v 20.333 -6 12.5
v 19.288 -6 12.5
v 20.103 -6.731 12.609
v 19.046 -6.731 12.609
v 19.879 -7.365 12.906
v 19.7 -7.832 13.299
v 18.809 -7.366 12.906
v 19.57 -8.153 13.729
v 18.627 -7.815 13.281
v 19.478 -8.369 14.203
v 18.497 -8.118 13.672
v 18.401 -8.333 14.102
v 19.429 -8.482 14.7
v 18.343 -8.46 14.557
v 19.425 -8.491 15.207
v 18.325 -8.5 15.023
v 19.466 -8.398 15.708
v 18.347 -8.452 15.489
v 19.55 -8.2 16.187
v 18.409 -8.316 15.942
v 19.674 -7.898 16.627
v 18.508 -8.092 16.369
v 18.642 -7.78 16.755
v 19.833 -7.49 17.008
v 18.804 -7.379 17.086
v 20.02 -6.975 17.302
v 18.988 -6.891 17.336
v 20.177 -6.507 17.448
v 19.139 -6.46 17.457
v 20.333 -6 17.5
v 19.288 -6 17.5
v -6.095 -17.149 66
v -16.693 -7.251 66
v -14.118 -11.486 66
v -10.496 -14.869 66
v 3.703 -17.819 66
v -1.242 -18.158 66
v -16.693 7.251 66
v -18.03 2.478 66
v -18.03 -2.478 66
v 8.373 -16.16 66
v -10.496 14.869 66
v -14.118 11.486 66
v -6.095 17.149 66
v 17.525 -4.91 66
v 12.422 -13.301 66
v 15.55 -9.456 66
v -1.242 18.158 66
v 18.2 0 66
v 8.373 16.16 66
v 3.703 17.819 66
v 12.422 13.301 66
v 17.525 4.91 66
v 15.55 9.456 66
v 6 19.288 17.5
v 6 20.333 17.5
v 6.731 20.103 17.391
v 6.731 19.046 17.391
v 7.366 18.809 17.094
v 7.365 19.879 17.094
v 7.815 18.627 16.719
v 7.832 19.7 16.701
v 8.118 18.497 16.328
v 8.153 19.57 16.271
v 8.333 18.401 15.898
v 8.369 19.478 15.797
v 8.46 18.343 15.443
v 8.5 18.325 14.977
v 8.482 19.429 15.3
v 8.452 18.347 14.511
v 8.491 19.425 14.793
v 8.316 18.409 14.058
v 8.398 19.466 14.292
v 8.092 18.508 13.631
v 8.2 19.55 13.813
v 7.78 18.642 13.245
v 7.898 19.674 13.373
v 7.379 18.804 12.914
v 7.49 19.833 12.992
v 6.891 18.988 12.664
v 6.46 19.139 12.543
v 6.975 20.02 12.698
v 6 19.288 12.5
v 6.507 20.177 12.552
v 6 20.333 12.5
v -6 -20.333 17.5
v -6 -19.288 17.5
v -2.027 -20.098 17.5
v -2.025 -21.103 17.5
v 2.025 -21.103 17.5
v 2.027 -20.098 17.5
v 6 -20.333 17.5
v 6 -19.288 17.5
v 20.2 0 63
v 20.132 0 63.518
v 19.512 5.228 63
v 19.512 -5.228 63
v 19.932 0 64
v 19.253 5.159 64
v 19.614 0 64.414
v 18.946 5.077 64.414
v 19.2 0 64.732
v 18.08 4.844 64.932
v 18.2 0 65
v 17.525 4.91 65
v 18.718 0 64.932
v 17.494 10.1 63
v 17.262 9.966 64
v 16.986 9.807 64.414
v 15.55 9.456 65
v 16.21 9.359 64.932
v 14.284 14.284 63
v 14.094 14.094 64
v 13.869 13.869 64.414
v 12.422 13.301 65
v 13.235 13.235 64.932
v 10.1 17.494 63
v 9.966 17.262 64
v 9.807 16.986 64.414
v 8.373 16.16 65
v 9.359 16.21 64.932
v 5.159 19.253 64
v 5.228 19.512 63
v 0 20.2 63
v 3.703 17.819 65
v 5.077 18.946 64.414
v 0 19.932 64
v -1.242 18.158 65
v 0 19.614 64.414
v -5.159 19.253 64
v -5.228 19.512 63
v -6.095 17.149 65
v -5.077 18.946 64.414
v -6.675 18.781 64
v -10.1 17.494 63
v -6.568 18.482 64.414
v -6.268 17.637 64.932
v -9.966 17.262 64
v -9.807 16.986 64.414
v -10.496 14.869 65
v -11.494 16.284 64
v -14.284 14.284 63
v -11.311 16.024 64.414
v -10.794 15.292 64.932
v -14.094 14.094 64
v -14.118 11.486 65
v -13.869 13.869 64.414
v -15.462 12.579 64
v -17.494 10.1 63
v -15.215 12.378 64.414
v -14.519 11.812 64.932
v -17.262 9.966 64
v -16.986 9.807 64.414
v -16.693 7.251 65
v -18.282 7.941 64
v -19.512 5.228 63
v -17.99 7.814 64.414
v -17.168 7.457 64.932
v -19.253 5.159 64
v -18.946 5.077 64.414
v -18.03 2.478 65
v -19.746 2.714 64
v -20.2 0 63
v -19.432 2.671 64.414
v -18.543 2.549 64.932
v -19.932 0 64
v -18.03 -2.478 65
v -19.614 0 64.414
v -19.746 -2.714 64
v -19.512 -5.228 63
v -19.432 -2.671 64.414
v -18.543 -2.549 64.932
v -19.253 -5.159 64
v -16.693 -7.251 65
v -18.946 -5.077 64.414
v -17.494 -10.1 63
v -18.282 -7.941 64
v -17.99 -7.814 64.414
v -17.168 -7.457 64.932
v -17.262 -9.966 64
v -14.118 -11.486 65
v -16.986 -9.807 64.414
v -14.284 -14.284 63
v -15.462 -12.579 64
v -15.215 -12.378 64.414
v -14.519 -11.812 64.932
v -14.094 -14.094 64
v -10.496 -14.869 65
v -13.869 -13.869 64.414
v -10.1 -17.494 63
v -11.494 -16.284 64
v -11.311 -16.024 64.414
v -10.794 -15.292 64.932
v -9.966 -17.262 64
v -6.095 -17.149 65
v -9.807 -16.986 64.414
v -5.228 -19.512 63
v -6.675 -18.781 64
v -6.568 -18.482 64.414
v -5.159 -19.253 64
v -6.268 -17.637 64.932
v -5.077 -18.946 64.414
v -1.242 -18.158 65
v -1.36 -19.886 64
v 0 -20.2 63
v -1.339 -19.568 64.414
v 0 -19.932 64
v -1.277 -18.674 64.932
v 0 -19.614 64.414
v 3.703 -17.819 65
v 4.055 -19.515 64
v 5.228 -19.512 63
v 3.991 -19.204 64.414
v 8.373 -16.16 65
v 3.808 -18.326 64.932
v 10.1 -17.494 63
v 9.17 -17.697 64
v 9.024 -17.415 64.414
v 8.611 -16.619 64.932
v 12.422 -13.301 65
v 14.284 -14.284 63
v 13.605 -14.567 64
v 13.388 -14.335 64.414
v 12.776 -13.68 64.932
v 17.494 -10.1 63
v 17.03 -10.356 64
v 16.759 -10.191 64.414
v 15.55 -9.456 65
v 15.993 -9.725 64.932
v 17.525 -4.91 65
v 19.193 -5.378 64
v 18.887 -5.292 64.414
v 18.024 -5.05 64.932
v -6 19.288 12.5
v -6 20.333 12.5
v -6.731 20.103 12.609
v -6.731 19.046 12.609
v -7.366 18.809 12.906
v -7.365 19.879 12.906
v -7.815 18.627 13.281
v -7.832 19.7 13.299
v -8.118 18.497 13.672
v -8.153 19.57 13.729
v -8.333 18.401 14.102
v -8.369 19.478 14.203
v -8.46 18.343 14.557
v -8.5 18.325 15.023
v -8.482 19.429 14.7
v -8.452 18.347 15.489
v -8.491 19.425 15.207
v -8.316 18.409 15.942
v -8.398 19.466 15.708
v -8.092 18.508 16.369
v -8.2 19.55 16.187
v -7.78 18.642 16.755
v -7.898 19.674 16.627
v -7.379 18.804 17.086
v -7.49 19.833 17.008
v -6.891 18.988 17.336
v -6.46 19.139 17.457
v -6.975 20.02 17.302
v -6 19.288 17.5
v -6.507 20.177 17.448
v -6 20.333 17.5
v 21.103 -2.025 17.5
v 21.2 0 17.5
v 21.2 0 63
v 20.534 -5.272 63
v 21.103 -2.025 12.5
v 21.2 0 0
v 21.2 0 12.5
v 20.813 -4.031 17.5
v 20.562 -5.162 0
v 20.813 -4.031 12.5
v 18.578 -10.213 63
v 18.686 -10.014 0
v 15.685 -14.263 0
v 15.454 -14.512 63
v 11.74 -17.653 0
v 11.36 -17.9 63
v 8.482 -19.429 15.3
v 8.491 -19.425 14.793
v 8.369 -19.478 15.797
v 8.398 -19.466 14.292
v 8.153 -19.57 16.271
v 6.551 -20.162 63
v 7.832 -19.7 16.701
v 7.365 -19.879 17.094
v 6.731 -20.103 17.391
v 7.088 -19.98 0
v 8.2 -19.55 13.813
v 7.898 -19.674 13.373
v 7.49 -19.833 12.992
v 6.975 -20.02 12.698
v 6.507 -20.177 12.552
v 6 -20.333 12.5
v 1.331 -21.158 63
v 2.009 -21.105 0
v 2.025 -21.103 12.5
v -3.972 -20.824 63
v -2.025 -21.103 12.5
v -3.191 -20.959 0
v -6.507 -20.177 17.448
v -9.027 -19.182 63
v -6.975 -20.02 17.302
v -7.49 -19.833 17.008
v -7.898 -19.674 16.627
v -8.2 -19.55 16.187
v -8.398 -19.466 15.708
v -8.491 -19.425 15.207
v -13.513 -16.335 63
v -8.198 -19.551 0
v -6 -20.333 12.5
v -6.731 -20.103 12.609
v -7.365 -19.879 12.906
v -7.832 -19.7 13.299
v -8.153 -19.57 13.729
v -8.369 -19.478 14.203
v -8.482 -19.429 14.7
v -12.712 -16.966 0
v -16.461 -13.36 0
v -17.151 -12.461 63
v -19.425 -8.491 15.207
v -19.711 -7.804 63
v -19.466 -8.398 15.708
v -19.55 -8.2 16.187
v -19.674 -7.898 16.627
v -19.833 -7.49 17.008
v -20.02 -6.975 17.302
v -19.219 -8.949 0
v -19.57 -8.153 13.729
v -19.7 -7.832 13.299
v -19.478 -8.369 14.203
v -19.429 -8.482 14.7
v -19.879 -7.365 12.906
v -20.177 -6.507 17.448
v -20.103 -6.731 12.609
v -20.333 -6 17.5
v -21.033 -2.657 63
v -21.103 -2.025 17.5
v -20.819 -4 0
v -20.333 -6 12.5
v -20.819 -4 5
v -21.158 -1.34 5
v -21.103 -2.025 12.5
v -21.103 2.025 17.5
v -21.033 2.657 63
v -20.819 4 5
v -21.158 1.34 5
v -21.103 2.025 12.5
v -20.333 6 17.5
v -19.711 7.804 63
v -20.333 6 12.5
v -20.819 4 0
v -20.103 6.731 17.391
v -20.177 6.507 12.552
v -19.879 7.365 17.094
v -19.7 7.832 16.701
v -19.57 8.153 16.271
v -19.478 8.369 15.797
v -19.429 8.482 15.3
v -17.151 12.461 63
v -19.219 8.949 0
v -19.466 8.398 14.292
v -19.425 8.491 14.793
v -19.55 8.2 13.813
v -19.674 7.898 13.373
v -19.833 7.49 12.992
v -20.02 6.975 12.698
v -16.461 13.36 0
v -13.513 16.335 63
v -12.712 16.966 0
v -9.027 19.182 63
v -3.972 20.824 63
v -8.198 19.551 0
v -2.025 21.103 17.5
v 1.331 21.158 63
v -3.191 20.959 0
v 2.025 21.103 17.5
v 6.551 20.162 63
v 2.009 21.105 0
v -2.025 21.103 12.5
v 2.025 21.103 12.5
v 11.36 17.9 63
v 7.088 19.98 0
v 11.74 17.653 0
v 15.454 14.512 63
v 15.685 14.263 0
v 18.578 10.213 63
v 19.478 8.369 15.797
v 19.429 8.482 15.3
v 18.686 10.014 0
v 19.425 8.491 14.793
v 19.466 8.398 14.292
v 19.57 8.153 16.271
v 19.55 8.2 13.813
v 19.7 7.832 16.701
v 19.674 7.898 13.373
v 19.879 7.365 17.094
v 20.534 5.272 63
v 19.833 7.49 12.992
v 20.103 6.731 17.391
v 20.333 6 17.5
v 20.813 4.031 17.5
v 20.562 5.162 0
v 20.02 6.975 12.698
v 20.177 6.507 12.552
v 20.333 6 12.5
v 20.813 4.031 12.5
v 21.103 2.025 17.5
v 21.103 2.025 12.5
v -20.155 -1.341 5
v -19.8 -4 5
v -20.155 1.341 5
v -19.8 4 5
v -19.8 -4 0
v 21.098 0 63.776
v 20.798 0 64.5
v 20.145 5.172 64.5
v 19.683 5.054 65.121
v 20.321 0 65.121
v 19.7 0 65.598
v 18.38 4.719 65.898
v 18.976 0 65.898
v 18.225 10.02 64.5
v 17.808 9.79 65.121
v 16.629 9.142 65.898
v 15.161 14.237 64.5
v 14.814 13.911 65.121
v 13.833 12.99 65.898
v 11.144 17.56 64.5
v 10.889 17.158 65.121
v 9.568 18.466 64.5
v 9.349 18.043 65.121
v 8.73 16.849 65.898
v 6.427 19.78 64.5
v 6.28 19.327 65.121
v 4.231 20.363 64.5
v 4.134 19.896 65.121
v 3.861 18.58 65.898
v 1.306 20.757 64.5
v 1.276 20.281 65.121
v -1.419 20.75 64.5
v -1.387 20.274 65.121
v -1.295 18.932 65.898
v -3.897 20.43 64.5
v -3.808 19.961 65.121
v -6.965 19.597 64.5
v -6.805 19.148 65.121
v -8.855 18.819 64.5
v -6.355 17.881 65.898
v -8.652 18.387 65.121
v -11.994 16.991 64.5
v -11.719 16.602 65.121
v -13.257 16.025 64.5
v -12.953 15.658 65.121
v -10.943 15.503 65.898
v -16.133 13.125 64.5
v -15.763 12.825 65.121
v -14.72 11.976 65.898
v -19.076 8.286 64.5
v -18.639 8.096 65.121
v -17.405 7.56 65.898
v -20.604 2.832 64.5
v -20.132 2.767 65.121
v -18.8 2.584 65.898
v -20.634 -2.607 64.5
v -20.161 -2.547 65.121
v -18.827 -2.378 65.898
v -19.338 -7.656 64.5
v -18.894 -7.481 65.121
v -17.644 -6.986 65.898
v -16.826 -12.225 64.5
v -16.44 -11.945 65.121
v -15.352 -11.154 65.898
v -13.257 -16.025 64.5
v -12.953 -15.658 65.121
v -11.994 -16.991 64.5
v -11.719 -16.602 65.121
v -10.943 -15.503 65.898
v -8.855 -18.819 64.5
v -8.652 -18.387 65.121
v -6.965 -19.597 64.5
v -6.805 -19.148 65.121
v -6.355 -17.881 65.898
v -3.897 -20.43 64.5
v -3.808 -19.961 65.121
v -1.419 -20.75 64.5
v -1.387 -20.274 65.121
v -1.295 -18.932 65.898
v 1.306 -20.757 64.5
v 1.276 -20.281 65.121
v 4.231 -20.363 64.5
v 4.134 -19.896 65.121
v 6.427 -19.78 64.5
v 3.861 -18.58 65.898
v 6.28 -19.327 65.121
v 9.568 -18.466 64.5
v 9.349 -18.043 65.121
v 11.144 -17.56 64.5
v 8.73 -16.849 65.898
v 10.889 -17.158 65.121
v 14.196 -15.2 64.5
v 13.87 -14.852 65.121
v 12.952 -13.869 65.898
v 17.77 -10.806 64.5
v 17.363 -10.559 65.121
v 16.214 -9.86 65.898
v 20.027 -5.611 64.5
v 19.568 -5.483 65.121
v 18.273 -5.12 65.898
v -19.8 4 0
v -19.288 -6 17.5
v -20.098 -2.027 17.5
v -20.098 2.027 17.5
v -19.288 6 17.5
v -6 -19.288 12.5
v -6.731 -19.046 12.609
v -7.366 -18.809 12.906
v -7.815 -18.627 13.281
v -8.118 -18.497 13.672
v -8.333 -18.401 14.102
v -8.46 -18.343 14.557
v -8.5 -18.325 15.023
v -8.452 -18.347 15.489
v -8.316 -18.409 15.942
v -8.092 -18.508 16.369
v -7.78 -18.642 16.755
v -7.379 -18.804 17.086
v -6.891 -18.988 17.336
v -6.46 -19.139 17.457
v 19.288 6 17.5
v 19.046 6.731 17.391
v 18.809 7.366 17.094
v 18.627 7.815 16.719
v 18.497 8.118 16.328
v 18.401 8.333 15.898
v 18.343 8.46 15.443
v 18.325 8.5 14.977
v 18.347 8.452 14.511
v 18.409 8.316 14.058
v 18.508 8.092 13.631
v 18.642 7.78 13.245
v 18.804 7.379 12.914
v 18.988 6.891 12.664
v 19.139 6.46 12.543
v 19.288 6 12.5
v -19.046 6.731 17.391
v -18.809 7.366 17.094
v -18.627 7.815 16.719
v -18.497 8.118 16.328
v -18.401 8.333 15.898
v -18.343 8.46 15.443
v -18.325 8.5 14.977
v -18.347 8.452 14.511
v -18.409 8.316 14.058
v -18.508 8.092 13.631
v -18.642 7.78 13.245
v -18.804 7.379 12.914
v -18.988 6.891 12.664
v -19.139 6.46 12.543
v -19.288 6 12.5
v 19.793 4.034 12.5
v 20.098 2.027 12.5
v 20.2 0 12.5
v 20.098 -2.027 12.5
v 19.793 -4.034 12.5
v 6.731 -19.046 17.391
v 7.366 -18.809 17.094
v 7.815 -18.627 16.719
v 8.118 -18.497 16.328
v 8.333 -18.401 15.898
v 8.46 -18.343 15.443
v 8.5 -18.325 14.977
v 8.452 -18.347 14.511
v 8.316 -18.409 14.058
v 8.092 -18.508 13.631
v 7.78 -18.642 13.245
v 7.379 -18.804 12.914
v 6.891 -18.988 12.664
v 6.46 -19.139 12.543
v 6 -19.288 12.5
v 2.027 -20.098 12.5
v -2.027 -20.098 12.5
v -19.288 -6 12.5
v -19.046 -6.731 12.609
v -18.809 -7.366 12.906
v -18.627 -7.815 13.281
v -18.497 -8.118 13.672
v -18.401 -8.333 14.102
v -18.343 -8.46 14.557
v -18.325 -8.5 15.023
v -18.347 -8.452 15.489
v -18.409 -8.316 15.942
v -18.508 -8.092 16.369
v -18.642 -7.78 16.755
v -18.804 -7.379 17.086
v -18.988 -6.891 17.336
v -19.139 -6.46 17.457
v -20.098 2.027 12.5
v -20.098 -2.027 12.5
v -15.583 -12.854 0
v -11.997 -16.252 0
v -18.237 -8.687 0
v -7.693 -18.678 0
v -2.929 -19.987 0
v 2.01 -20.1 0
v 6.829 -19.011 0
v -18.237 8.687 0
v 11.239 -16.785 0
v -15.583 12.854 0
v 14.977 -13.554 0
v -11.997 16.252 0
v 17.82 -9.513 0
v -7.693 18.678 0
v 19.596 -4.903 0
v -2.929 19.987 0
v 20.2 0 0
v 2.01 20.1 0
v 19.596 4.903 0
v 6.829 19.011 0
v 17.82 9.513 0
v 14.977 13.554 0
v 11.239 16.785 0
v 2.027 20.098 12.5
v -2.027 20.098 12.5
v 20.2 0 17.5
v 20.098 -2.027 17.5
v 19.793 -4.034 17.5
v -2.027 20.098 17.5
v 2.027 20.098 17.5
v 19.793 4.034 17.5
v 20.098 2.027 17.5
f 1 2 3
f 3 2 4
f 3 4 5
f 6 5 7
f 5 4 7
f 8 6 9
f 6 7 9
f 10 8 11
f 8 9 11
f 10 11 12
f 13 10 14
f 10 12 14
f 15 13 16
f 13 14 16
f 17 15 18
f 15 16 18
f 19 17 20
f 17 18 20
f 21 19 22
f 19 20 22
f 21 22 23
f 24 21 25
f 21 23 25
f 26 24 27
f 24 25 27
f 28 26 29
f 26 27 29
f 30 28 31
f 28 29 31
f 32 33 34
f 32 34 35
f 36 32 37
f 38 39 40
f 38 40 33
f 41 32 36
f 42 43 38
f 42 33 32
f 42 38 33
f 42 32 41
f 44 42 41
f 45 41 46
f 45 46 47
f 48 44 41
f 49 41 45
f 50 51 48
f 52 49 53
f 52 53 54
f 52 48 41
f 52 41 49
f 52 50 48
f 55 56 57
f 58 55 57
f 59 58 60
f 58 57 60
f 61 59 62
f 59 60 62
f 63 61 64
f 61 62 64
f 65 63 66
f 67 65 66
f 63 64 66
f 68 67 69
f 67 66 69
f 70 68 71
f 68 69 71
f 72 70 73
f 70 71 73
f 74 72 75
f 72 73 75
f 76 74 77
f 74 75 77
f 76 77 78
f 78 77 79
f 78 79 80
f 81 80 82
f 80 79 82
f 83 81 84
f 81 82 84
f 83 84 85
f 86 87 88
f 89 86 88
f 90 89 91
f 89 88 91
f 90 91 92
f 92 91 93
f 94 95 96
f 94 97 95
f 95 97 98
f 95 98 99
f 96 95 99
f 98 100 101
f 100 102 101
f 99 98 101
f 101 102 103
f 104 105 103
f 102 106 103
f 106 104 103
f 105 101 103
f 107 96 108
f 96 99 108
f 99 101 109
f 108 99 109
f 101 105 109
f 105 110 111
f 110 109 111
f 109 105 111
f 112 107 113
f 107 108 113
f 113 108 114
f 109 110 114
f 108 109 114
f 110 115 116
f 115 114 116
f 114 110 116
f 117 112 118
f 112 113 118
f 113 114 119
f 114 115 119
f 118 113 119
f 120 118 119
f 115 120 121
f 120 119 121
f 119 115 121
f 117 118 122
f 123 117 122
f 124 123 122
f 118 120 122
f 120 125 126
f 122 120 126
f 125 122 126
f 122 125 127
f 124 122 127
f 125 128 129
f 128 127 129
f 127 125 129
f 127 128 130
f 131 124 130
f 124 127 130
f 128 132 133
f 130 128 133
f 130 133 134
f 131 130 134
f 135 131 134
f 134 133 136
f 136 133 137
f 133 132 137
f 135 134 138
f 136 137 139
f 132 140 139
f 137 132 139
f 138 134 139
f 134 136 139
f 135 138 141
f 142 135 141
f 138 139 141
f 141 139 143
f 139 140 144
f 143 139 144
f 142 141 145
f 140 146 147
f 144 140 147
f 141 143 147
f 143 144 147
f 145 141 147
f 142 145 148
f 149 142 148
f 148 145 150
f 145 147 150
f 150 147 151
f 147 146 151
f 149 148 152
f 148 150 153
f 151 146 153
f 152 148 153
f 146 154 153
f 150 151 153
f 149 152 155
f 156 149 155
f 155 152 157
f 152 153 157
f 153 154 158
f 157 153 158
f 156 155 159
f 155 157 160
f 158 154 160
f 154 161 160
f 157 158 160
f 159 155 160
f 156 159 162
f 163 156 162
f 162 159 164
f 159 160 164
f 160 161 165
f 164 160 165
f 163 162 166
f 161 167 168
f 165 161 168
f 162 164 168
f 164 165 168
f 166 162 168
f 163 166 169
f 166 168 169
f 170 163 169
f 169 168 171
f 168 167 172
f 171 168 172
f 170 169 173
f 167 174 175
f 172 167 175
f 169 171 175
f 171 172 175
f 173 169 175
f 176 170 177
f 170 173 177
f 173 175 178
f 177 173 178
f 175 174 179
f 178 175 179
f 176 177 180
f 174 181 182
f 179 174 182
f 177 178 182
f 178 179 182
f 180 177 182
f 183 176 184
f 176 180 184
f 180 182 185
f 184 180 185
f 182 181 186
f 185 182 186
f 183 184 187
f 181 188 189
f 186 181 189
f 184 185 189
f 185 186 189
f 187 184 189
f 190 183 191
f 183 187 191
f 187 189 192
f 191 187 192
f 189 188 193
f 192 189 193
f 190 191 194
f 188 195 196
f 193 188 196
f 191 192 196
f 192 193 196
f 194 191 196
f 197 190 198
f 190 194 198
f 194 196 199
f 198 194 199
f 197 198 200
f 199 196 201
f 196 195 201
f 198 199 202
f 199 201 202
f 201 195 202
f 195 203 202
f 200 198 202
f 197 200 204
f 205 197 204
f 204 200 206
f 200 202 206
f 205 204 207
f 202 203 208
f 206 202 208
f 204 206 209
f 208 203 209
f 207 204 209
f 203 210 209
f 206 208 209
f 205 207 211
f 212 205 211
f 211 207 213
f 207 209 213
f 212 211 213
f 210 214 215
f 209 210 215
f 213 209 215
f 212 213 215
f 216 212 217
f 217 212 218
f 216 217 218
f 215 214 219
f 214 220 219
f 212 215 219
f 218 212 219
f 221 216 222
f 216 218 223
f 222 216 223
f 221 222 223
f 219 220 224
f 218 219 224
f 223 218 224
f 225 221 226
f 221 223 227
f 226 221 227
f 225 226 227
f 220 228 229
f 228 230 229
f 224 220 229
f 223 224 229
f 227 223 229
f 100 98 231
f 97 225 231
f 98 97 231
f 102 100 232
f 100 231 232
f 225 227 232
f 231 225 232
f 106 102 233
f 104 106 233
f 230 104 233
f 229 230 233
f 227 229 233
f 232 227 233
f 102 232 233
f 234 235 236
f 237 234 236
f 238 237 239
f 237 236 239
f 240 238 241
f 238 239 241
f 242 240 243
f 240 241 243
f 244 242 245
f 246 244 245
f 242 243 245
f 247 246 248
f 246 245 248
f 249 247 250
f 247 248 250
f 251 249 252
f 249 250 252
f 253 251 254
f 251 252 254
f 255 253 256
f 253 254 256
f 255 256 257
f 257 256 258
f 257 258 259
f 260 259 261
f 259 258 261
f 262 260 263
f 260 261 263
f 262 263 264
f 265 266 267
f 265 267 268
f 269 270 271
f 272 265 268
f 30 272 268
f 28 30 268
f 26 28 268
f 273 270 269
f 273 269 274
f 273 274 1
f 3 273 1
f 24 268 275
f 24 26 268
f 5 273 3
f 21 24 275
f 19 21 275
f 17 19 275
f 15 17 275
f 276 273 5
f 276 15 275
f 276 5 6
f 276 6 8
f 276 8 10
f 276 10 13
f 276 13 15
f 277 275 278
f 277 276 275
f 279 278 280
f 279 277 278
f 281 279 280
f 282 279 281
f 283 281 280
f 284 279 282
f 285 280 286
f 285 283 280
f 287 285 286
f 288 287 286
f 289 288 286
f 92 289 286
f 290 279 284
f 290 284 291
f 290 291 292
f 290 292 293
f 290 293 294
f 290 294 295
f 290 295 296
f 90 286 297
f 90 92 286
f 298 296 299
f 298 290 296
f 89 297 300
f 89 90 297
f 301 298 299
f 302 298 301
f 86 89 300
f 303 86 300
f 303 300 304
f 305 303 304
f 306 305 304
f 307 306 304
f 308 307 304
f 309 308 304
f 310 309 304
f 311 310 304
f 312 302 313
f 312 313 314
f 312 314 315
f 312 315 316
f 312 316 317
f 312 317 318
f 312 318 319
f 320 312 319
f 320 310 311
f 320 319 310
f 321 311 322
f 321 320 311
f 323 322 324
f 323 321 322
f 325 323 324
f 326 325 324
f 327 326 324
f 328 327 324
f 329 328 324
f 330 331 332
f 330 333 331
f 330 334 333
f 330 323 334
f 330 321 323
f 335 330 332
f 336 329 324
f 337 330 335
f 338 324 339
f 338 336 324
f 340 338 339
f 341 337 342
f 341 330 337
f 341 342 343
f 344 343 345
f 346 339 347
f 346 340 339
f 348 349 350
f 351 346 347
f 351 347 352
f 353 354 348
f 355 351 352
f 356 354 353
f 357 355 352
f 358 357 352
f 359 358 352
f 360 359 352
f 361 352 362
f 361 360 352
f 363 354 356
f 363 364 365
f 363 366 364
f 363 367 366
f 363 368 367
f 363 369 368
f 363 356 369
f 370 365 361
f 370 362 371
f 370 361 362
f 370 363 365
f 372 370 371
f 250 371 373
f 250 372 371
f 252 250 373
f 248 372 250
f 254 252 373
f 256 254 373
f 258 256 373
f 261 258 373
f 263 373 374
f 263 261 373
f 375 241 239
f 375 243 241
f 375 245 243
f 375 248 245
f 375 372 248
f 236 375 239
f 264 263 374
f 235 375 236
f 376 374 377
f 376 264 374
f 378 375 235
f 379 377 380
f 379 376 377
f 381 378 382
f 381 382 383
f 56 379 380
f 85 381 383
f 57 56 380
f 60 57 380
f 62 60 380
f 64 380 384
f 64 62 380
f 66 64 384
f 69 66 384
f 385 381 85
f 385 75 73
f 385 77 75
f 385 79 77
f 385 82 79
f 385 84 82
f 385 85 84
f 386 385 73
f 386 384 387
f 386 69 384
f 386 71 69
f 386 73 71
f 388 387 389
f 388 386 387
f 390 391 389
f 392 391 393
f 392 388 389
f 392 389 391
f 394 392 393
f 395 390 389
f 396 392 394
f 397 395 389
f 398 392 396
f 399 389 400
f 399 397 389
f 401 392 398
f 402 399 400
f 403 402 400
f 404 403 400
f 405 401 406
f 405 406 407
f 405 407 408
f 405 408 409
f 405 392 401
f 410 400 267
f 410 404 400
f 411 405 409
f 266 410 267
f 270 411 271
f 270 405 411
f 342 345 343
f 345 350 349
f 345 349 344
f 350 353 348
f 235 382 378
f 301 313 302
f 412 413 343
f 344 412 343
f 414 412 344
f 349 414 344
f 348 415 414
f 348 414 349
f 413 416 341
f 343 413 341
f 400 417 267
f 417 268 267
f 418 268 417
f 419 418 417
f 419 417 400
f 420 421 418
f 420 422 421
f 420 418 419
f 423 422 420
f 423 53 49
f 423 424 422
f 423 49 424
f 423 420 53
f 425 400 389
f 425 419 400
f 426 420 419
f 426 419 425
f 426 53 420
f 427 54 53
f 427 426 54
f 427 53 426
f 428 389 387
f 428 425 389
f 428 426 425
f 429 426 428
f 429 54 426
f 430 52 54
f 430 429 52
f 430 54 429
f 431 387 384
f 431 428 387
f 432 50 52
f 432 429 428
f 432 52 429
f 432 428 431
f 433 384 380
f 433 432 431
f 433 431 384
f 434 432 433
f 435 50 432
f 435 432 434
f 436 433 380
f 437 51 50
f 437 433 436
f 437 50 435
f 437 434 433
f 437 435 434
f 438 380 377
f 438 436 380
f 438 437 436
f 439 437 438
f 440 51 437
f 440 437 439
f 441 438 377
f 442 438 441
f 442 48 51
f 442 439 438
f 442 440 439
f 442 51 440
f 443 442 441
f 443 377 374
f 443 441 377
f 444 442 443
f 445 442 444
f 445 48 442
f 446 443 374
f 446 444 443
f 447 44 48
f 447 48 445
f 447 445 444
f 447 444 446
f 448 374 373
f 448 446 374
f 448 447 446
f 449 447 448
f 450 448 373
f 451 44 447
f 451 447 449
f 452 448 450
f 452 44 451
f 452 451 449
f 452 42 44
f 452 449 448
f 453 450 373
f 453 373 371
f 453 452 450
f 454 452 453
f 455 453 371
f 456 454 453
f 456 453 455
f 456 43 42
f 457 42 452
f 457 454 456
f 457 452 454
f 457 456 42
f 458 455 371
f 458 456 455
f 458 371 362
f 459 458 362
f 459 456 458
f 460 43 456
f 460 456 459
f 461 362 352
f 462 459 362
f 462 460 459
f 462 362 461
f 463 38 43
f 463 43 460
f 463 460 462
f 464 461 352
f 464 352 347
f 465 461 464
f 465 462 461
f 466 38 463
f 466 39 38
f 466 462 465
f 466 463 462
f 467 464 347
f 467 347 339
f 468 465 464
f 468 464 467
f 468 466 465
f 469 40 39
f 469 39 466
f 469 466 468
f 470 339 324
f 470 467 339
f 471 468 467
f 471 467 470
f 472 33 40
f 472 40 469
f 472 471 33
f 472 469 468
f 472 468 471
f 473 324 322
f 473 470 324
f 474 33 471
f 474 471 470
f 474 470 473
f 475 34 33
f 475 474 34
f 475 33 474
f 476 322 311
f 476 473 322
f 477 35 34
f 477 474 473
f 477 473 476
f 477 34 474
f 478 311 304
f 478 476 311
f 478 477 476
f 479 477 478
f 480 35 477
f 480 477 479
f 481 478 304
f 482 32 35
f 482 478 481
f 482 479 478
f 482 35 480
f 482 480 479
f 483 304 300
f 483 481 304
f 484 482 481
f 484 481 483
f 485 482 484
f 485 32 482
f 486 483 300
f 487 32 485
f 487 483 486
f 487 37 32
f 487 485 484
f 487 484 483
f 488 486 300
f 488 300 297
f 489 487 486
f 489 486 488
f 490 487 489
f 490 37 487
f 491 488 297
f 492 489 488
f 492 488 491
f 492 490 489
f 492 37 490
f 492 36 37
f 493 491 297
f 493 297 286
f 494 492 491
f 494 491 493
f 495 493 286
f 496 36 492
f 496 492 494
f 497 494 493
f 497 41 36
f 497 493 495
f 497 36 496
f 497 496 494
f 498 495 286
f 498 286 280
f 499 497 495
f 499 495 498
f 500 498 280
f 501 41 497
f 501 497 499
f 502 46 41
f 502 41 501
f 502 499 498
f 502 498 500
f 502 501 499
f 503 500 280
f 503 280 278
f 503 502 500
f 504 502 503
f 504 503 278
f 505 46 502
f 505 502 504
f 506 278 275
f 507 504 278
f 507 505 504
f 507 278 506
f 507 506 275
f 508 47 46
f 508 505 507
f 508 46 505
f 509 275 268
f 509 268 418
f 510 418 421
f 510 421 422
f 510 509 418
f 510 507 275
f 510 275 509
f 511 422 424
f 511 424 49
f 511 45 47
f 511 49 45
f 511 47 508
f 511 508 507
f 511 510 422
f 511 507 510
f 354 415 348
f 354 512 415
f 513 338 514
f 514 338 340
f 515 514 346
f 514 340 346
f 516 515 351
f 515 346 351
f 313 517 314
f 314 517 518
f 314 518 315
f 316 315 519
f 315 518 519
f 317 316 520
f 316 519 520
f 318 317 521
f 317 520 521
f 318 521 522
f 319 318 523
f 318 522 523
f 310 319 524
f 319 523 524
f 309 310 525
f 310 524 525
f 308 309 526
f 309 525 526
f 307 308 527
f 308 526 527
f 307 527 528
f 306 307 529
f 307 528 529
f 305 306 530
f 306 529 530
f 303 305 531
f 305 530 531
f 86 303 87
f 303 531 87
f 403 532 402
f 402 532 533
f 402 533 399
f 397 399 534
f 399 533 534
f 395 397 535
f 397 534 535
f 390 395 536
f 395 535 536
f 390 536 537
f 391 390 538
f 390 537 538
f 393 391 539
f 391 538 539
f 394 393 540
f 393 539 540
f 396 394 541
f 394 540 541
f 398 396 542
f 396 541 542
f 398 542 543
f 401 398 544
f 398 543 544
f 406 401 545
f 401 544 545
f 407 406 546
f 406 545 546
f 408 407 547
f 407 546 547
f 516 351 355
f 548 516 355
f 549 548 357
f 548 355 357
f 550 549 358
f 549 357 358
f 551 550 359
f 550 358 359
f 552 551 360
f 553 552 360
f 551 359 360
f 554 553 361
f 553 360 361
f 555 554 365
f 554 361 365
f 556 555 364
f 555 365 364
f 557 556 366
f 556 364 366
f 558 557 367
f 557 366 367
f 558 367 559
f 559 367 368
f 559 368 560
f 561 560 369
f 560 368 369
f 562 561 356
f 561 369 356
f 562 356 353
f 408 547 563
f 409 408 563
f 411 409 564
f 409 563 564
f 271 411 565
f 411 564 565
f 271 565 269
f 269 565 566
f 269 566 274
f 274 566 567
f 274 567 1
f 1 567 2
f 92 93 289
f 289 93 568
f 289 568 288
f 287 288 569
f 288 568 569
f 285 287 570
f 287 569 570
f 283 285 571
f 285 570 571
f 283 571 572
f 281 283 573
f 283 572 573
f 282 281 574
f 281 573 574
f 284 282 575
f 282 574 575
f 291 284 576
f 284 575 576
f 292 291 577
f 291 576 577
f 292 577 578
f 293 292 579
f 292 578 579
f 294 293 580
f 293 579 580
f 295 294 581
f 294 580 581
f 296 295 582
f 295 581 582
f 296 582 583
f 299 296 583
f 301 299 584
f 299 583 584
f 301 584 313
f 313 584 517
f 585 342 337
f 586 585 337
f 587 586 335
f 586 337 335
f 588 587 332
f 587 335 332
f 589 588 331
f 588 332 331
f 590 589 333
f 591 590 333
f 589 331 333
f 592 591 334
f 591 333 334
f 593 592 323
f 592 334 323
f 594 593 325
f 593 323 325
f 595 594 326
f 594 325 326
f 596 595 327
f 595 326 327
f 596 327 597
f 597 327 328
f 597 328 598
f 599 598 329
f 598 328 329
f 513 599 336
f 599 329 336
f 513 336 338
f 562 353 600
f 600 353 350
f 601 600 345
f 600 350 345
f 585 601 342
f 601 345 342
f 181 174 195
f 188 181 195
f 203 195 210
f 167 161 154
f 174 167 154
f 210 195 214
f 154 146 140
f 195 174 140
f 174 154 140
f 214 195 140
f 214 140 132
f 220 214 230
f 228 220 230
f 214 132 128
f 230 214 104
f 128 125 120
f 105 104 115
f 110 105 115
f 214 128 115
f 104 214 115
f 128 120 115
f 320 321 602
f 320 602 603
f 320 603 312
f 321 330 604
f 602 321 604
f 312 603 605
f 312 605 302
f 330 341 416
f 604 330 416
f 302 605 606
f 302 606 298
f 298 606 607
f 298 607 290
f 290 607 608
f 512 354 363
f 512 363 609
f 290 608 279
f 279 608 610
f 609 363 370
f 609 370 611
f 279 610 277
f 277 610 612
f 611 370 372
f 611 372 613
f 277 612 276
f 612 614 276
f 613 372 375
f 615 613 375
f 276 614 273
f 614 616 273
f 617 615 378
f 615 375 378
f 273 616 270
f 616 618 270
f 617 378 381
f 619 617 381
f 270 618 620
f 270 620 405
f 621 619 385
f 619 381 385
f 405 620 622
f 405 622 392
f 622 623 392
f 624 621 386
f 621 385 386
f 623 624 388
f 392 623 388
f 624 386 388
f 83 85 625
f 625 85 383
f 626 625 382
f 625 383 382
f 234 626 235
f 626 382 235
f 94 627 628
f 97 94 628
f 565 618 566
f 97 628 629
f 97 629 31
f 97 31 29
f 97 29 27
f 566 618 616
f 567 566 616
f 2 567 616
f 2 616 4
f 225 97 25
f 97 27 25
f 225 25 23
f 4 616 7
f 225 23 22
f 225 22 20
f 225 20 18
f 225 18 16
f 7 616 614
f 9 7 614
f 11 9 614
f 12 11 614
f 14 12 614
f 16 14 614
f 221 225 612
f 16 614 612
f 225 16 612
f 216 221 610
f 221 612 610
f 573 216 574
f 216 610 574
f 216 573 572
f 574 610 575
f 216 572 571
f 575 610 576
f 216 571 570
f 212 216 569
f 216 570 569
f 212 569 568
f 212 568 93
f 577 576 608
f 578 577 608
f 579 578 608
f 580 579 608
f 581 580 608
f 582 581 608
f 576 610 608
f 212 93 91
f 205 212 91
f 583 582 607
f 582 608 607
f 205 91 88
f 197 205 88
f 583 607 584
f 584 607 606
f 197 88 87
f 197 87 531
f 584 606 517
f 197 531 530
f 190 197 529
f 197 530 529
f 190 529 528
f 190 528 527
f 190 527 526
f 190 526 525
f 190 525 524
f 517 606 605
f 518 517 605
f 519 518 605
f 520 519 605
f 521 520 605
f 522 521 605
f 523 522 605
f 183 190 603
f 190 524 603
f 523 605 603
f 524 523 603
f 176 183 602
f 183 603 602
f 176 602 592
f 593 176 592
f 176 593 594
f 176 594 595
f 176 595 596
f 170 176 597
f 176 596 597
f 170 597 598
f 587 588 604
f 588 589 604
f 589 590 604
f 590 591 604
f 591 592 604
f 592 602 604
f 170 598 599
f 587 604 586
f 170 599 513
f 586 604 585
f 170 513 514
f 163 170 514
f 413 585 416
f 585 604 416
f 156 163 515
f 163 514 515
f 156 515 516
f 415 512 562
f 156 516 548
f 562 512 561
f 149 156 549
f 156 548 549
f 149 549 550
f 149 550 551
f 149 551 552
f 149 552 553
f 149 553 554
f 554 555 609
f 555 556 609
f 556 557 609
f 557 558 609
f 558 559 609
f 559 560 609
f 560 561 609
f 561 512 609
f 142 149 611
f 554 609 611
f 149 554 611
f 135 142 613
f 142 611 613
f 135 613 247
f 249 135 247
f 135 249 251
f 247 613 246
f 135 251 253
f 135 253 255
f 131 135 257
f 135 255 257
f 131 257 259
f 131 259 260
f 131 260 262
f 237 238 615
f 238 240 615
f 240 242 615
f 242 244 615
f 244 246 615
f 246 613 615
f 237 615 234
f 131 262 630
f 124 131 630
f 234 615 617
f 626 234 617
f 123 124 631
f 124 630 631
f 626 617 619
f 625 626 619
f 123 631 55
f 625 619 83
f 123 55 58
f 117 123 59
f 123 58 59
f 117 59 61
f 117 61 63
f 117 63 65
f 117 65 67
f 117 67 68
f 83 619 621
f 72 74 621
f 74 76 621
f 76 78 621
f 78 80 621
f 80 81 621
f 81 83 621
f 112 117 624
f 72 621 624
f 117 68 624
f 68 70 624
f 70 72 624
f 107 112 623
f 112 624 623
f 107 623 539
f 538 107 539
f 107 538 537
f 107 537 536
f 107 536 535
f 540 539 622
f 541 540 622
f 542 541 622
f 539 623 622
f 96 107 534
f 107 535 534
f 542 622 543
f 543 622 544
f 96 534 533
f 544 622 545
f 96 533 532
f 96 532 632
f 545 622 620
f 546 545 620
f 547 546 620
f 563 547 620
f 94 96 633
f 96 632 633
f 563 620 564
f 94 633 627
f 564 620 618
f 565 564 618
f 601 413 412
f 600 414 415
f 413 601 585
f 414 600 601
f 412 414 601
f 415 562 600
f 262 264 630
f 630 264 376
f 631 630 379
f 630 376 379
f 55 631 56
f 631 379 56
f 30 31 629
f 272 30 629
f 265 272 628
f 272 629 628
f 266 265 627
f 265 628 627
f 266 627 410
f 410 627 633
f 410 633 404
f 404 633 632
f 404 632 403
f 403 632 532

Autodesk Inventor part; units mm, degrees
ref_plane "YZ Plane" through (0, 0, 0) normal (1, 0, 0) x (0, 1, 0)
ref_plane "XZ Plane" through (0, 0, 0) normal (0, 1, 0) x (-1, 0, 0)
sketch "스케치1" plane through (0, 0, 0) normal (0, 0, 1) x (1, 0, 0)
  circle A0 centre (0, 0) radius 21.2
  dimension "d0" = 42.4
extrude "돌출1" add sketch "스케치1" along normal blind 30
sketch "스케치2" plane through (0, 0, 30) normal (0, 0, 1) x (1, 0, 0)
  circle A0 centre (0, 0) radius 21.2
  dimension "d3" = 42.4
extrude "돌출2" add sketch "스케치2" along normal blind 30
sketch "스케치3" plane through (0, 0, 60) normal (0, 0, 1) x (1, 0, 0)
  circle A0 centre (0, 0) radius 21.2
  dimension "d6" = 42.4
extrude "돌출3" add sketch "스케치3" along normal blind 6
fillet "모깎기1" radius 3 1 edges at (-21.2, 0, 66)
shell "쉘1" thickness 1 removed faces 1 at (2.7392, 4.6861, 0)
ref_plane "작업 평면1" through (0, 21.2, 0) normal (0, 1, 0) x (-1, 0, 0)
sketch "스케치12" plane through (0, 21.2, 0) normal (0, 1, 0) x (-1, 0, 0)
  line L0 (0, 0) -> (0, 60)
  line L1 (0, 60) -> (0, 30)
  line L2 (0, 30) -> (0, 15)
  line L3 (-6, 15) -> (6, 15) construction
  line L4 (-6, 12.5) -> (6, 12.5)
  line L5 (6, 17.5) -> (-6, 17.5)
  arc A0 (-6, 17.5) -> (-6, 12.5) centre (-6, 15) ccw
  arc A1 (6, 12.5) -> (6, 17.5) centre (6, 15) ccw
  dimension "d47" = 60
  dimension "d48" = 30
  dimension "d49" = 15
  dimension "d50" = 6
  dimension "d51" = 5
extrude "돌출12" cut sketch "스케치12" against normal through all
pattern_circular "원형 패턴2" count 4 over 360 about axis through (0, 0, 0) along (0, 0, 1) of "돌출12"
sketch "스케치13" plane through (0, 0, 0) normal (0, 0, -1) x (-1, 0, 0)
  line L0 (0, 0) -> (0, -4)
  line L1 (0, -4) -> (0, 4)
  line L2 (0, 4) -> (20.8192, 4)
  circle A0 centre (0, 0) radius 21.2 projected
  line L3 (0, -4) -> (20.8192, -4)
  dimension "d61" = 4
  dimension "d62" = 8
extrude "돌출13" cut sketch "스케치13" against normal blind 5 contours L1 L2 A0 L3 L0 picked at (6.9397, -2.6667)
properties part number "motor"
